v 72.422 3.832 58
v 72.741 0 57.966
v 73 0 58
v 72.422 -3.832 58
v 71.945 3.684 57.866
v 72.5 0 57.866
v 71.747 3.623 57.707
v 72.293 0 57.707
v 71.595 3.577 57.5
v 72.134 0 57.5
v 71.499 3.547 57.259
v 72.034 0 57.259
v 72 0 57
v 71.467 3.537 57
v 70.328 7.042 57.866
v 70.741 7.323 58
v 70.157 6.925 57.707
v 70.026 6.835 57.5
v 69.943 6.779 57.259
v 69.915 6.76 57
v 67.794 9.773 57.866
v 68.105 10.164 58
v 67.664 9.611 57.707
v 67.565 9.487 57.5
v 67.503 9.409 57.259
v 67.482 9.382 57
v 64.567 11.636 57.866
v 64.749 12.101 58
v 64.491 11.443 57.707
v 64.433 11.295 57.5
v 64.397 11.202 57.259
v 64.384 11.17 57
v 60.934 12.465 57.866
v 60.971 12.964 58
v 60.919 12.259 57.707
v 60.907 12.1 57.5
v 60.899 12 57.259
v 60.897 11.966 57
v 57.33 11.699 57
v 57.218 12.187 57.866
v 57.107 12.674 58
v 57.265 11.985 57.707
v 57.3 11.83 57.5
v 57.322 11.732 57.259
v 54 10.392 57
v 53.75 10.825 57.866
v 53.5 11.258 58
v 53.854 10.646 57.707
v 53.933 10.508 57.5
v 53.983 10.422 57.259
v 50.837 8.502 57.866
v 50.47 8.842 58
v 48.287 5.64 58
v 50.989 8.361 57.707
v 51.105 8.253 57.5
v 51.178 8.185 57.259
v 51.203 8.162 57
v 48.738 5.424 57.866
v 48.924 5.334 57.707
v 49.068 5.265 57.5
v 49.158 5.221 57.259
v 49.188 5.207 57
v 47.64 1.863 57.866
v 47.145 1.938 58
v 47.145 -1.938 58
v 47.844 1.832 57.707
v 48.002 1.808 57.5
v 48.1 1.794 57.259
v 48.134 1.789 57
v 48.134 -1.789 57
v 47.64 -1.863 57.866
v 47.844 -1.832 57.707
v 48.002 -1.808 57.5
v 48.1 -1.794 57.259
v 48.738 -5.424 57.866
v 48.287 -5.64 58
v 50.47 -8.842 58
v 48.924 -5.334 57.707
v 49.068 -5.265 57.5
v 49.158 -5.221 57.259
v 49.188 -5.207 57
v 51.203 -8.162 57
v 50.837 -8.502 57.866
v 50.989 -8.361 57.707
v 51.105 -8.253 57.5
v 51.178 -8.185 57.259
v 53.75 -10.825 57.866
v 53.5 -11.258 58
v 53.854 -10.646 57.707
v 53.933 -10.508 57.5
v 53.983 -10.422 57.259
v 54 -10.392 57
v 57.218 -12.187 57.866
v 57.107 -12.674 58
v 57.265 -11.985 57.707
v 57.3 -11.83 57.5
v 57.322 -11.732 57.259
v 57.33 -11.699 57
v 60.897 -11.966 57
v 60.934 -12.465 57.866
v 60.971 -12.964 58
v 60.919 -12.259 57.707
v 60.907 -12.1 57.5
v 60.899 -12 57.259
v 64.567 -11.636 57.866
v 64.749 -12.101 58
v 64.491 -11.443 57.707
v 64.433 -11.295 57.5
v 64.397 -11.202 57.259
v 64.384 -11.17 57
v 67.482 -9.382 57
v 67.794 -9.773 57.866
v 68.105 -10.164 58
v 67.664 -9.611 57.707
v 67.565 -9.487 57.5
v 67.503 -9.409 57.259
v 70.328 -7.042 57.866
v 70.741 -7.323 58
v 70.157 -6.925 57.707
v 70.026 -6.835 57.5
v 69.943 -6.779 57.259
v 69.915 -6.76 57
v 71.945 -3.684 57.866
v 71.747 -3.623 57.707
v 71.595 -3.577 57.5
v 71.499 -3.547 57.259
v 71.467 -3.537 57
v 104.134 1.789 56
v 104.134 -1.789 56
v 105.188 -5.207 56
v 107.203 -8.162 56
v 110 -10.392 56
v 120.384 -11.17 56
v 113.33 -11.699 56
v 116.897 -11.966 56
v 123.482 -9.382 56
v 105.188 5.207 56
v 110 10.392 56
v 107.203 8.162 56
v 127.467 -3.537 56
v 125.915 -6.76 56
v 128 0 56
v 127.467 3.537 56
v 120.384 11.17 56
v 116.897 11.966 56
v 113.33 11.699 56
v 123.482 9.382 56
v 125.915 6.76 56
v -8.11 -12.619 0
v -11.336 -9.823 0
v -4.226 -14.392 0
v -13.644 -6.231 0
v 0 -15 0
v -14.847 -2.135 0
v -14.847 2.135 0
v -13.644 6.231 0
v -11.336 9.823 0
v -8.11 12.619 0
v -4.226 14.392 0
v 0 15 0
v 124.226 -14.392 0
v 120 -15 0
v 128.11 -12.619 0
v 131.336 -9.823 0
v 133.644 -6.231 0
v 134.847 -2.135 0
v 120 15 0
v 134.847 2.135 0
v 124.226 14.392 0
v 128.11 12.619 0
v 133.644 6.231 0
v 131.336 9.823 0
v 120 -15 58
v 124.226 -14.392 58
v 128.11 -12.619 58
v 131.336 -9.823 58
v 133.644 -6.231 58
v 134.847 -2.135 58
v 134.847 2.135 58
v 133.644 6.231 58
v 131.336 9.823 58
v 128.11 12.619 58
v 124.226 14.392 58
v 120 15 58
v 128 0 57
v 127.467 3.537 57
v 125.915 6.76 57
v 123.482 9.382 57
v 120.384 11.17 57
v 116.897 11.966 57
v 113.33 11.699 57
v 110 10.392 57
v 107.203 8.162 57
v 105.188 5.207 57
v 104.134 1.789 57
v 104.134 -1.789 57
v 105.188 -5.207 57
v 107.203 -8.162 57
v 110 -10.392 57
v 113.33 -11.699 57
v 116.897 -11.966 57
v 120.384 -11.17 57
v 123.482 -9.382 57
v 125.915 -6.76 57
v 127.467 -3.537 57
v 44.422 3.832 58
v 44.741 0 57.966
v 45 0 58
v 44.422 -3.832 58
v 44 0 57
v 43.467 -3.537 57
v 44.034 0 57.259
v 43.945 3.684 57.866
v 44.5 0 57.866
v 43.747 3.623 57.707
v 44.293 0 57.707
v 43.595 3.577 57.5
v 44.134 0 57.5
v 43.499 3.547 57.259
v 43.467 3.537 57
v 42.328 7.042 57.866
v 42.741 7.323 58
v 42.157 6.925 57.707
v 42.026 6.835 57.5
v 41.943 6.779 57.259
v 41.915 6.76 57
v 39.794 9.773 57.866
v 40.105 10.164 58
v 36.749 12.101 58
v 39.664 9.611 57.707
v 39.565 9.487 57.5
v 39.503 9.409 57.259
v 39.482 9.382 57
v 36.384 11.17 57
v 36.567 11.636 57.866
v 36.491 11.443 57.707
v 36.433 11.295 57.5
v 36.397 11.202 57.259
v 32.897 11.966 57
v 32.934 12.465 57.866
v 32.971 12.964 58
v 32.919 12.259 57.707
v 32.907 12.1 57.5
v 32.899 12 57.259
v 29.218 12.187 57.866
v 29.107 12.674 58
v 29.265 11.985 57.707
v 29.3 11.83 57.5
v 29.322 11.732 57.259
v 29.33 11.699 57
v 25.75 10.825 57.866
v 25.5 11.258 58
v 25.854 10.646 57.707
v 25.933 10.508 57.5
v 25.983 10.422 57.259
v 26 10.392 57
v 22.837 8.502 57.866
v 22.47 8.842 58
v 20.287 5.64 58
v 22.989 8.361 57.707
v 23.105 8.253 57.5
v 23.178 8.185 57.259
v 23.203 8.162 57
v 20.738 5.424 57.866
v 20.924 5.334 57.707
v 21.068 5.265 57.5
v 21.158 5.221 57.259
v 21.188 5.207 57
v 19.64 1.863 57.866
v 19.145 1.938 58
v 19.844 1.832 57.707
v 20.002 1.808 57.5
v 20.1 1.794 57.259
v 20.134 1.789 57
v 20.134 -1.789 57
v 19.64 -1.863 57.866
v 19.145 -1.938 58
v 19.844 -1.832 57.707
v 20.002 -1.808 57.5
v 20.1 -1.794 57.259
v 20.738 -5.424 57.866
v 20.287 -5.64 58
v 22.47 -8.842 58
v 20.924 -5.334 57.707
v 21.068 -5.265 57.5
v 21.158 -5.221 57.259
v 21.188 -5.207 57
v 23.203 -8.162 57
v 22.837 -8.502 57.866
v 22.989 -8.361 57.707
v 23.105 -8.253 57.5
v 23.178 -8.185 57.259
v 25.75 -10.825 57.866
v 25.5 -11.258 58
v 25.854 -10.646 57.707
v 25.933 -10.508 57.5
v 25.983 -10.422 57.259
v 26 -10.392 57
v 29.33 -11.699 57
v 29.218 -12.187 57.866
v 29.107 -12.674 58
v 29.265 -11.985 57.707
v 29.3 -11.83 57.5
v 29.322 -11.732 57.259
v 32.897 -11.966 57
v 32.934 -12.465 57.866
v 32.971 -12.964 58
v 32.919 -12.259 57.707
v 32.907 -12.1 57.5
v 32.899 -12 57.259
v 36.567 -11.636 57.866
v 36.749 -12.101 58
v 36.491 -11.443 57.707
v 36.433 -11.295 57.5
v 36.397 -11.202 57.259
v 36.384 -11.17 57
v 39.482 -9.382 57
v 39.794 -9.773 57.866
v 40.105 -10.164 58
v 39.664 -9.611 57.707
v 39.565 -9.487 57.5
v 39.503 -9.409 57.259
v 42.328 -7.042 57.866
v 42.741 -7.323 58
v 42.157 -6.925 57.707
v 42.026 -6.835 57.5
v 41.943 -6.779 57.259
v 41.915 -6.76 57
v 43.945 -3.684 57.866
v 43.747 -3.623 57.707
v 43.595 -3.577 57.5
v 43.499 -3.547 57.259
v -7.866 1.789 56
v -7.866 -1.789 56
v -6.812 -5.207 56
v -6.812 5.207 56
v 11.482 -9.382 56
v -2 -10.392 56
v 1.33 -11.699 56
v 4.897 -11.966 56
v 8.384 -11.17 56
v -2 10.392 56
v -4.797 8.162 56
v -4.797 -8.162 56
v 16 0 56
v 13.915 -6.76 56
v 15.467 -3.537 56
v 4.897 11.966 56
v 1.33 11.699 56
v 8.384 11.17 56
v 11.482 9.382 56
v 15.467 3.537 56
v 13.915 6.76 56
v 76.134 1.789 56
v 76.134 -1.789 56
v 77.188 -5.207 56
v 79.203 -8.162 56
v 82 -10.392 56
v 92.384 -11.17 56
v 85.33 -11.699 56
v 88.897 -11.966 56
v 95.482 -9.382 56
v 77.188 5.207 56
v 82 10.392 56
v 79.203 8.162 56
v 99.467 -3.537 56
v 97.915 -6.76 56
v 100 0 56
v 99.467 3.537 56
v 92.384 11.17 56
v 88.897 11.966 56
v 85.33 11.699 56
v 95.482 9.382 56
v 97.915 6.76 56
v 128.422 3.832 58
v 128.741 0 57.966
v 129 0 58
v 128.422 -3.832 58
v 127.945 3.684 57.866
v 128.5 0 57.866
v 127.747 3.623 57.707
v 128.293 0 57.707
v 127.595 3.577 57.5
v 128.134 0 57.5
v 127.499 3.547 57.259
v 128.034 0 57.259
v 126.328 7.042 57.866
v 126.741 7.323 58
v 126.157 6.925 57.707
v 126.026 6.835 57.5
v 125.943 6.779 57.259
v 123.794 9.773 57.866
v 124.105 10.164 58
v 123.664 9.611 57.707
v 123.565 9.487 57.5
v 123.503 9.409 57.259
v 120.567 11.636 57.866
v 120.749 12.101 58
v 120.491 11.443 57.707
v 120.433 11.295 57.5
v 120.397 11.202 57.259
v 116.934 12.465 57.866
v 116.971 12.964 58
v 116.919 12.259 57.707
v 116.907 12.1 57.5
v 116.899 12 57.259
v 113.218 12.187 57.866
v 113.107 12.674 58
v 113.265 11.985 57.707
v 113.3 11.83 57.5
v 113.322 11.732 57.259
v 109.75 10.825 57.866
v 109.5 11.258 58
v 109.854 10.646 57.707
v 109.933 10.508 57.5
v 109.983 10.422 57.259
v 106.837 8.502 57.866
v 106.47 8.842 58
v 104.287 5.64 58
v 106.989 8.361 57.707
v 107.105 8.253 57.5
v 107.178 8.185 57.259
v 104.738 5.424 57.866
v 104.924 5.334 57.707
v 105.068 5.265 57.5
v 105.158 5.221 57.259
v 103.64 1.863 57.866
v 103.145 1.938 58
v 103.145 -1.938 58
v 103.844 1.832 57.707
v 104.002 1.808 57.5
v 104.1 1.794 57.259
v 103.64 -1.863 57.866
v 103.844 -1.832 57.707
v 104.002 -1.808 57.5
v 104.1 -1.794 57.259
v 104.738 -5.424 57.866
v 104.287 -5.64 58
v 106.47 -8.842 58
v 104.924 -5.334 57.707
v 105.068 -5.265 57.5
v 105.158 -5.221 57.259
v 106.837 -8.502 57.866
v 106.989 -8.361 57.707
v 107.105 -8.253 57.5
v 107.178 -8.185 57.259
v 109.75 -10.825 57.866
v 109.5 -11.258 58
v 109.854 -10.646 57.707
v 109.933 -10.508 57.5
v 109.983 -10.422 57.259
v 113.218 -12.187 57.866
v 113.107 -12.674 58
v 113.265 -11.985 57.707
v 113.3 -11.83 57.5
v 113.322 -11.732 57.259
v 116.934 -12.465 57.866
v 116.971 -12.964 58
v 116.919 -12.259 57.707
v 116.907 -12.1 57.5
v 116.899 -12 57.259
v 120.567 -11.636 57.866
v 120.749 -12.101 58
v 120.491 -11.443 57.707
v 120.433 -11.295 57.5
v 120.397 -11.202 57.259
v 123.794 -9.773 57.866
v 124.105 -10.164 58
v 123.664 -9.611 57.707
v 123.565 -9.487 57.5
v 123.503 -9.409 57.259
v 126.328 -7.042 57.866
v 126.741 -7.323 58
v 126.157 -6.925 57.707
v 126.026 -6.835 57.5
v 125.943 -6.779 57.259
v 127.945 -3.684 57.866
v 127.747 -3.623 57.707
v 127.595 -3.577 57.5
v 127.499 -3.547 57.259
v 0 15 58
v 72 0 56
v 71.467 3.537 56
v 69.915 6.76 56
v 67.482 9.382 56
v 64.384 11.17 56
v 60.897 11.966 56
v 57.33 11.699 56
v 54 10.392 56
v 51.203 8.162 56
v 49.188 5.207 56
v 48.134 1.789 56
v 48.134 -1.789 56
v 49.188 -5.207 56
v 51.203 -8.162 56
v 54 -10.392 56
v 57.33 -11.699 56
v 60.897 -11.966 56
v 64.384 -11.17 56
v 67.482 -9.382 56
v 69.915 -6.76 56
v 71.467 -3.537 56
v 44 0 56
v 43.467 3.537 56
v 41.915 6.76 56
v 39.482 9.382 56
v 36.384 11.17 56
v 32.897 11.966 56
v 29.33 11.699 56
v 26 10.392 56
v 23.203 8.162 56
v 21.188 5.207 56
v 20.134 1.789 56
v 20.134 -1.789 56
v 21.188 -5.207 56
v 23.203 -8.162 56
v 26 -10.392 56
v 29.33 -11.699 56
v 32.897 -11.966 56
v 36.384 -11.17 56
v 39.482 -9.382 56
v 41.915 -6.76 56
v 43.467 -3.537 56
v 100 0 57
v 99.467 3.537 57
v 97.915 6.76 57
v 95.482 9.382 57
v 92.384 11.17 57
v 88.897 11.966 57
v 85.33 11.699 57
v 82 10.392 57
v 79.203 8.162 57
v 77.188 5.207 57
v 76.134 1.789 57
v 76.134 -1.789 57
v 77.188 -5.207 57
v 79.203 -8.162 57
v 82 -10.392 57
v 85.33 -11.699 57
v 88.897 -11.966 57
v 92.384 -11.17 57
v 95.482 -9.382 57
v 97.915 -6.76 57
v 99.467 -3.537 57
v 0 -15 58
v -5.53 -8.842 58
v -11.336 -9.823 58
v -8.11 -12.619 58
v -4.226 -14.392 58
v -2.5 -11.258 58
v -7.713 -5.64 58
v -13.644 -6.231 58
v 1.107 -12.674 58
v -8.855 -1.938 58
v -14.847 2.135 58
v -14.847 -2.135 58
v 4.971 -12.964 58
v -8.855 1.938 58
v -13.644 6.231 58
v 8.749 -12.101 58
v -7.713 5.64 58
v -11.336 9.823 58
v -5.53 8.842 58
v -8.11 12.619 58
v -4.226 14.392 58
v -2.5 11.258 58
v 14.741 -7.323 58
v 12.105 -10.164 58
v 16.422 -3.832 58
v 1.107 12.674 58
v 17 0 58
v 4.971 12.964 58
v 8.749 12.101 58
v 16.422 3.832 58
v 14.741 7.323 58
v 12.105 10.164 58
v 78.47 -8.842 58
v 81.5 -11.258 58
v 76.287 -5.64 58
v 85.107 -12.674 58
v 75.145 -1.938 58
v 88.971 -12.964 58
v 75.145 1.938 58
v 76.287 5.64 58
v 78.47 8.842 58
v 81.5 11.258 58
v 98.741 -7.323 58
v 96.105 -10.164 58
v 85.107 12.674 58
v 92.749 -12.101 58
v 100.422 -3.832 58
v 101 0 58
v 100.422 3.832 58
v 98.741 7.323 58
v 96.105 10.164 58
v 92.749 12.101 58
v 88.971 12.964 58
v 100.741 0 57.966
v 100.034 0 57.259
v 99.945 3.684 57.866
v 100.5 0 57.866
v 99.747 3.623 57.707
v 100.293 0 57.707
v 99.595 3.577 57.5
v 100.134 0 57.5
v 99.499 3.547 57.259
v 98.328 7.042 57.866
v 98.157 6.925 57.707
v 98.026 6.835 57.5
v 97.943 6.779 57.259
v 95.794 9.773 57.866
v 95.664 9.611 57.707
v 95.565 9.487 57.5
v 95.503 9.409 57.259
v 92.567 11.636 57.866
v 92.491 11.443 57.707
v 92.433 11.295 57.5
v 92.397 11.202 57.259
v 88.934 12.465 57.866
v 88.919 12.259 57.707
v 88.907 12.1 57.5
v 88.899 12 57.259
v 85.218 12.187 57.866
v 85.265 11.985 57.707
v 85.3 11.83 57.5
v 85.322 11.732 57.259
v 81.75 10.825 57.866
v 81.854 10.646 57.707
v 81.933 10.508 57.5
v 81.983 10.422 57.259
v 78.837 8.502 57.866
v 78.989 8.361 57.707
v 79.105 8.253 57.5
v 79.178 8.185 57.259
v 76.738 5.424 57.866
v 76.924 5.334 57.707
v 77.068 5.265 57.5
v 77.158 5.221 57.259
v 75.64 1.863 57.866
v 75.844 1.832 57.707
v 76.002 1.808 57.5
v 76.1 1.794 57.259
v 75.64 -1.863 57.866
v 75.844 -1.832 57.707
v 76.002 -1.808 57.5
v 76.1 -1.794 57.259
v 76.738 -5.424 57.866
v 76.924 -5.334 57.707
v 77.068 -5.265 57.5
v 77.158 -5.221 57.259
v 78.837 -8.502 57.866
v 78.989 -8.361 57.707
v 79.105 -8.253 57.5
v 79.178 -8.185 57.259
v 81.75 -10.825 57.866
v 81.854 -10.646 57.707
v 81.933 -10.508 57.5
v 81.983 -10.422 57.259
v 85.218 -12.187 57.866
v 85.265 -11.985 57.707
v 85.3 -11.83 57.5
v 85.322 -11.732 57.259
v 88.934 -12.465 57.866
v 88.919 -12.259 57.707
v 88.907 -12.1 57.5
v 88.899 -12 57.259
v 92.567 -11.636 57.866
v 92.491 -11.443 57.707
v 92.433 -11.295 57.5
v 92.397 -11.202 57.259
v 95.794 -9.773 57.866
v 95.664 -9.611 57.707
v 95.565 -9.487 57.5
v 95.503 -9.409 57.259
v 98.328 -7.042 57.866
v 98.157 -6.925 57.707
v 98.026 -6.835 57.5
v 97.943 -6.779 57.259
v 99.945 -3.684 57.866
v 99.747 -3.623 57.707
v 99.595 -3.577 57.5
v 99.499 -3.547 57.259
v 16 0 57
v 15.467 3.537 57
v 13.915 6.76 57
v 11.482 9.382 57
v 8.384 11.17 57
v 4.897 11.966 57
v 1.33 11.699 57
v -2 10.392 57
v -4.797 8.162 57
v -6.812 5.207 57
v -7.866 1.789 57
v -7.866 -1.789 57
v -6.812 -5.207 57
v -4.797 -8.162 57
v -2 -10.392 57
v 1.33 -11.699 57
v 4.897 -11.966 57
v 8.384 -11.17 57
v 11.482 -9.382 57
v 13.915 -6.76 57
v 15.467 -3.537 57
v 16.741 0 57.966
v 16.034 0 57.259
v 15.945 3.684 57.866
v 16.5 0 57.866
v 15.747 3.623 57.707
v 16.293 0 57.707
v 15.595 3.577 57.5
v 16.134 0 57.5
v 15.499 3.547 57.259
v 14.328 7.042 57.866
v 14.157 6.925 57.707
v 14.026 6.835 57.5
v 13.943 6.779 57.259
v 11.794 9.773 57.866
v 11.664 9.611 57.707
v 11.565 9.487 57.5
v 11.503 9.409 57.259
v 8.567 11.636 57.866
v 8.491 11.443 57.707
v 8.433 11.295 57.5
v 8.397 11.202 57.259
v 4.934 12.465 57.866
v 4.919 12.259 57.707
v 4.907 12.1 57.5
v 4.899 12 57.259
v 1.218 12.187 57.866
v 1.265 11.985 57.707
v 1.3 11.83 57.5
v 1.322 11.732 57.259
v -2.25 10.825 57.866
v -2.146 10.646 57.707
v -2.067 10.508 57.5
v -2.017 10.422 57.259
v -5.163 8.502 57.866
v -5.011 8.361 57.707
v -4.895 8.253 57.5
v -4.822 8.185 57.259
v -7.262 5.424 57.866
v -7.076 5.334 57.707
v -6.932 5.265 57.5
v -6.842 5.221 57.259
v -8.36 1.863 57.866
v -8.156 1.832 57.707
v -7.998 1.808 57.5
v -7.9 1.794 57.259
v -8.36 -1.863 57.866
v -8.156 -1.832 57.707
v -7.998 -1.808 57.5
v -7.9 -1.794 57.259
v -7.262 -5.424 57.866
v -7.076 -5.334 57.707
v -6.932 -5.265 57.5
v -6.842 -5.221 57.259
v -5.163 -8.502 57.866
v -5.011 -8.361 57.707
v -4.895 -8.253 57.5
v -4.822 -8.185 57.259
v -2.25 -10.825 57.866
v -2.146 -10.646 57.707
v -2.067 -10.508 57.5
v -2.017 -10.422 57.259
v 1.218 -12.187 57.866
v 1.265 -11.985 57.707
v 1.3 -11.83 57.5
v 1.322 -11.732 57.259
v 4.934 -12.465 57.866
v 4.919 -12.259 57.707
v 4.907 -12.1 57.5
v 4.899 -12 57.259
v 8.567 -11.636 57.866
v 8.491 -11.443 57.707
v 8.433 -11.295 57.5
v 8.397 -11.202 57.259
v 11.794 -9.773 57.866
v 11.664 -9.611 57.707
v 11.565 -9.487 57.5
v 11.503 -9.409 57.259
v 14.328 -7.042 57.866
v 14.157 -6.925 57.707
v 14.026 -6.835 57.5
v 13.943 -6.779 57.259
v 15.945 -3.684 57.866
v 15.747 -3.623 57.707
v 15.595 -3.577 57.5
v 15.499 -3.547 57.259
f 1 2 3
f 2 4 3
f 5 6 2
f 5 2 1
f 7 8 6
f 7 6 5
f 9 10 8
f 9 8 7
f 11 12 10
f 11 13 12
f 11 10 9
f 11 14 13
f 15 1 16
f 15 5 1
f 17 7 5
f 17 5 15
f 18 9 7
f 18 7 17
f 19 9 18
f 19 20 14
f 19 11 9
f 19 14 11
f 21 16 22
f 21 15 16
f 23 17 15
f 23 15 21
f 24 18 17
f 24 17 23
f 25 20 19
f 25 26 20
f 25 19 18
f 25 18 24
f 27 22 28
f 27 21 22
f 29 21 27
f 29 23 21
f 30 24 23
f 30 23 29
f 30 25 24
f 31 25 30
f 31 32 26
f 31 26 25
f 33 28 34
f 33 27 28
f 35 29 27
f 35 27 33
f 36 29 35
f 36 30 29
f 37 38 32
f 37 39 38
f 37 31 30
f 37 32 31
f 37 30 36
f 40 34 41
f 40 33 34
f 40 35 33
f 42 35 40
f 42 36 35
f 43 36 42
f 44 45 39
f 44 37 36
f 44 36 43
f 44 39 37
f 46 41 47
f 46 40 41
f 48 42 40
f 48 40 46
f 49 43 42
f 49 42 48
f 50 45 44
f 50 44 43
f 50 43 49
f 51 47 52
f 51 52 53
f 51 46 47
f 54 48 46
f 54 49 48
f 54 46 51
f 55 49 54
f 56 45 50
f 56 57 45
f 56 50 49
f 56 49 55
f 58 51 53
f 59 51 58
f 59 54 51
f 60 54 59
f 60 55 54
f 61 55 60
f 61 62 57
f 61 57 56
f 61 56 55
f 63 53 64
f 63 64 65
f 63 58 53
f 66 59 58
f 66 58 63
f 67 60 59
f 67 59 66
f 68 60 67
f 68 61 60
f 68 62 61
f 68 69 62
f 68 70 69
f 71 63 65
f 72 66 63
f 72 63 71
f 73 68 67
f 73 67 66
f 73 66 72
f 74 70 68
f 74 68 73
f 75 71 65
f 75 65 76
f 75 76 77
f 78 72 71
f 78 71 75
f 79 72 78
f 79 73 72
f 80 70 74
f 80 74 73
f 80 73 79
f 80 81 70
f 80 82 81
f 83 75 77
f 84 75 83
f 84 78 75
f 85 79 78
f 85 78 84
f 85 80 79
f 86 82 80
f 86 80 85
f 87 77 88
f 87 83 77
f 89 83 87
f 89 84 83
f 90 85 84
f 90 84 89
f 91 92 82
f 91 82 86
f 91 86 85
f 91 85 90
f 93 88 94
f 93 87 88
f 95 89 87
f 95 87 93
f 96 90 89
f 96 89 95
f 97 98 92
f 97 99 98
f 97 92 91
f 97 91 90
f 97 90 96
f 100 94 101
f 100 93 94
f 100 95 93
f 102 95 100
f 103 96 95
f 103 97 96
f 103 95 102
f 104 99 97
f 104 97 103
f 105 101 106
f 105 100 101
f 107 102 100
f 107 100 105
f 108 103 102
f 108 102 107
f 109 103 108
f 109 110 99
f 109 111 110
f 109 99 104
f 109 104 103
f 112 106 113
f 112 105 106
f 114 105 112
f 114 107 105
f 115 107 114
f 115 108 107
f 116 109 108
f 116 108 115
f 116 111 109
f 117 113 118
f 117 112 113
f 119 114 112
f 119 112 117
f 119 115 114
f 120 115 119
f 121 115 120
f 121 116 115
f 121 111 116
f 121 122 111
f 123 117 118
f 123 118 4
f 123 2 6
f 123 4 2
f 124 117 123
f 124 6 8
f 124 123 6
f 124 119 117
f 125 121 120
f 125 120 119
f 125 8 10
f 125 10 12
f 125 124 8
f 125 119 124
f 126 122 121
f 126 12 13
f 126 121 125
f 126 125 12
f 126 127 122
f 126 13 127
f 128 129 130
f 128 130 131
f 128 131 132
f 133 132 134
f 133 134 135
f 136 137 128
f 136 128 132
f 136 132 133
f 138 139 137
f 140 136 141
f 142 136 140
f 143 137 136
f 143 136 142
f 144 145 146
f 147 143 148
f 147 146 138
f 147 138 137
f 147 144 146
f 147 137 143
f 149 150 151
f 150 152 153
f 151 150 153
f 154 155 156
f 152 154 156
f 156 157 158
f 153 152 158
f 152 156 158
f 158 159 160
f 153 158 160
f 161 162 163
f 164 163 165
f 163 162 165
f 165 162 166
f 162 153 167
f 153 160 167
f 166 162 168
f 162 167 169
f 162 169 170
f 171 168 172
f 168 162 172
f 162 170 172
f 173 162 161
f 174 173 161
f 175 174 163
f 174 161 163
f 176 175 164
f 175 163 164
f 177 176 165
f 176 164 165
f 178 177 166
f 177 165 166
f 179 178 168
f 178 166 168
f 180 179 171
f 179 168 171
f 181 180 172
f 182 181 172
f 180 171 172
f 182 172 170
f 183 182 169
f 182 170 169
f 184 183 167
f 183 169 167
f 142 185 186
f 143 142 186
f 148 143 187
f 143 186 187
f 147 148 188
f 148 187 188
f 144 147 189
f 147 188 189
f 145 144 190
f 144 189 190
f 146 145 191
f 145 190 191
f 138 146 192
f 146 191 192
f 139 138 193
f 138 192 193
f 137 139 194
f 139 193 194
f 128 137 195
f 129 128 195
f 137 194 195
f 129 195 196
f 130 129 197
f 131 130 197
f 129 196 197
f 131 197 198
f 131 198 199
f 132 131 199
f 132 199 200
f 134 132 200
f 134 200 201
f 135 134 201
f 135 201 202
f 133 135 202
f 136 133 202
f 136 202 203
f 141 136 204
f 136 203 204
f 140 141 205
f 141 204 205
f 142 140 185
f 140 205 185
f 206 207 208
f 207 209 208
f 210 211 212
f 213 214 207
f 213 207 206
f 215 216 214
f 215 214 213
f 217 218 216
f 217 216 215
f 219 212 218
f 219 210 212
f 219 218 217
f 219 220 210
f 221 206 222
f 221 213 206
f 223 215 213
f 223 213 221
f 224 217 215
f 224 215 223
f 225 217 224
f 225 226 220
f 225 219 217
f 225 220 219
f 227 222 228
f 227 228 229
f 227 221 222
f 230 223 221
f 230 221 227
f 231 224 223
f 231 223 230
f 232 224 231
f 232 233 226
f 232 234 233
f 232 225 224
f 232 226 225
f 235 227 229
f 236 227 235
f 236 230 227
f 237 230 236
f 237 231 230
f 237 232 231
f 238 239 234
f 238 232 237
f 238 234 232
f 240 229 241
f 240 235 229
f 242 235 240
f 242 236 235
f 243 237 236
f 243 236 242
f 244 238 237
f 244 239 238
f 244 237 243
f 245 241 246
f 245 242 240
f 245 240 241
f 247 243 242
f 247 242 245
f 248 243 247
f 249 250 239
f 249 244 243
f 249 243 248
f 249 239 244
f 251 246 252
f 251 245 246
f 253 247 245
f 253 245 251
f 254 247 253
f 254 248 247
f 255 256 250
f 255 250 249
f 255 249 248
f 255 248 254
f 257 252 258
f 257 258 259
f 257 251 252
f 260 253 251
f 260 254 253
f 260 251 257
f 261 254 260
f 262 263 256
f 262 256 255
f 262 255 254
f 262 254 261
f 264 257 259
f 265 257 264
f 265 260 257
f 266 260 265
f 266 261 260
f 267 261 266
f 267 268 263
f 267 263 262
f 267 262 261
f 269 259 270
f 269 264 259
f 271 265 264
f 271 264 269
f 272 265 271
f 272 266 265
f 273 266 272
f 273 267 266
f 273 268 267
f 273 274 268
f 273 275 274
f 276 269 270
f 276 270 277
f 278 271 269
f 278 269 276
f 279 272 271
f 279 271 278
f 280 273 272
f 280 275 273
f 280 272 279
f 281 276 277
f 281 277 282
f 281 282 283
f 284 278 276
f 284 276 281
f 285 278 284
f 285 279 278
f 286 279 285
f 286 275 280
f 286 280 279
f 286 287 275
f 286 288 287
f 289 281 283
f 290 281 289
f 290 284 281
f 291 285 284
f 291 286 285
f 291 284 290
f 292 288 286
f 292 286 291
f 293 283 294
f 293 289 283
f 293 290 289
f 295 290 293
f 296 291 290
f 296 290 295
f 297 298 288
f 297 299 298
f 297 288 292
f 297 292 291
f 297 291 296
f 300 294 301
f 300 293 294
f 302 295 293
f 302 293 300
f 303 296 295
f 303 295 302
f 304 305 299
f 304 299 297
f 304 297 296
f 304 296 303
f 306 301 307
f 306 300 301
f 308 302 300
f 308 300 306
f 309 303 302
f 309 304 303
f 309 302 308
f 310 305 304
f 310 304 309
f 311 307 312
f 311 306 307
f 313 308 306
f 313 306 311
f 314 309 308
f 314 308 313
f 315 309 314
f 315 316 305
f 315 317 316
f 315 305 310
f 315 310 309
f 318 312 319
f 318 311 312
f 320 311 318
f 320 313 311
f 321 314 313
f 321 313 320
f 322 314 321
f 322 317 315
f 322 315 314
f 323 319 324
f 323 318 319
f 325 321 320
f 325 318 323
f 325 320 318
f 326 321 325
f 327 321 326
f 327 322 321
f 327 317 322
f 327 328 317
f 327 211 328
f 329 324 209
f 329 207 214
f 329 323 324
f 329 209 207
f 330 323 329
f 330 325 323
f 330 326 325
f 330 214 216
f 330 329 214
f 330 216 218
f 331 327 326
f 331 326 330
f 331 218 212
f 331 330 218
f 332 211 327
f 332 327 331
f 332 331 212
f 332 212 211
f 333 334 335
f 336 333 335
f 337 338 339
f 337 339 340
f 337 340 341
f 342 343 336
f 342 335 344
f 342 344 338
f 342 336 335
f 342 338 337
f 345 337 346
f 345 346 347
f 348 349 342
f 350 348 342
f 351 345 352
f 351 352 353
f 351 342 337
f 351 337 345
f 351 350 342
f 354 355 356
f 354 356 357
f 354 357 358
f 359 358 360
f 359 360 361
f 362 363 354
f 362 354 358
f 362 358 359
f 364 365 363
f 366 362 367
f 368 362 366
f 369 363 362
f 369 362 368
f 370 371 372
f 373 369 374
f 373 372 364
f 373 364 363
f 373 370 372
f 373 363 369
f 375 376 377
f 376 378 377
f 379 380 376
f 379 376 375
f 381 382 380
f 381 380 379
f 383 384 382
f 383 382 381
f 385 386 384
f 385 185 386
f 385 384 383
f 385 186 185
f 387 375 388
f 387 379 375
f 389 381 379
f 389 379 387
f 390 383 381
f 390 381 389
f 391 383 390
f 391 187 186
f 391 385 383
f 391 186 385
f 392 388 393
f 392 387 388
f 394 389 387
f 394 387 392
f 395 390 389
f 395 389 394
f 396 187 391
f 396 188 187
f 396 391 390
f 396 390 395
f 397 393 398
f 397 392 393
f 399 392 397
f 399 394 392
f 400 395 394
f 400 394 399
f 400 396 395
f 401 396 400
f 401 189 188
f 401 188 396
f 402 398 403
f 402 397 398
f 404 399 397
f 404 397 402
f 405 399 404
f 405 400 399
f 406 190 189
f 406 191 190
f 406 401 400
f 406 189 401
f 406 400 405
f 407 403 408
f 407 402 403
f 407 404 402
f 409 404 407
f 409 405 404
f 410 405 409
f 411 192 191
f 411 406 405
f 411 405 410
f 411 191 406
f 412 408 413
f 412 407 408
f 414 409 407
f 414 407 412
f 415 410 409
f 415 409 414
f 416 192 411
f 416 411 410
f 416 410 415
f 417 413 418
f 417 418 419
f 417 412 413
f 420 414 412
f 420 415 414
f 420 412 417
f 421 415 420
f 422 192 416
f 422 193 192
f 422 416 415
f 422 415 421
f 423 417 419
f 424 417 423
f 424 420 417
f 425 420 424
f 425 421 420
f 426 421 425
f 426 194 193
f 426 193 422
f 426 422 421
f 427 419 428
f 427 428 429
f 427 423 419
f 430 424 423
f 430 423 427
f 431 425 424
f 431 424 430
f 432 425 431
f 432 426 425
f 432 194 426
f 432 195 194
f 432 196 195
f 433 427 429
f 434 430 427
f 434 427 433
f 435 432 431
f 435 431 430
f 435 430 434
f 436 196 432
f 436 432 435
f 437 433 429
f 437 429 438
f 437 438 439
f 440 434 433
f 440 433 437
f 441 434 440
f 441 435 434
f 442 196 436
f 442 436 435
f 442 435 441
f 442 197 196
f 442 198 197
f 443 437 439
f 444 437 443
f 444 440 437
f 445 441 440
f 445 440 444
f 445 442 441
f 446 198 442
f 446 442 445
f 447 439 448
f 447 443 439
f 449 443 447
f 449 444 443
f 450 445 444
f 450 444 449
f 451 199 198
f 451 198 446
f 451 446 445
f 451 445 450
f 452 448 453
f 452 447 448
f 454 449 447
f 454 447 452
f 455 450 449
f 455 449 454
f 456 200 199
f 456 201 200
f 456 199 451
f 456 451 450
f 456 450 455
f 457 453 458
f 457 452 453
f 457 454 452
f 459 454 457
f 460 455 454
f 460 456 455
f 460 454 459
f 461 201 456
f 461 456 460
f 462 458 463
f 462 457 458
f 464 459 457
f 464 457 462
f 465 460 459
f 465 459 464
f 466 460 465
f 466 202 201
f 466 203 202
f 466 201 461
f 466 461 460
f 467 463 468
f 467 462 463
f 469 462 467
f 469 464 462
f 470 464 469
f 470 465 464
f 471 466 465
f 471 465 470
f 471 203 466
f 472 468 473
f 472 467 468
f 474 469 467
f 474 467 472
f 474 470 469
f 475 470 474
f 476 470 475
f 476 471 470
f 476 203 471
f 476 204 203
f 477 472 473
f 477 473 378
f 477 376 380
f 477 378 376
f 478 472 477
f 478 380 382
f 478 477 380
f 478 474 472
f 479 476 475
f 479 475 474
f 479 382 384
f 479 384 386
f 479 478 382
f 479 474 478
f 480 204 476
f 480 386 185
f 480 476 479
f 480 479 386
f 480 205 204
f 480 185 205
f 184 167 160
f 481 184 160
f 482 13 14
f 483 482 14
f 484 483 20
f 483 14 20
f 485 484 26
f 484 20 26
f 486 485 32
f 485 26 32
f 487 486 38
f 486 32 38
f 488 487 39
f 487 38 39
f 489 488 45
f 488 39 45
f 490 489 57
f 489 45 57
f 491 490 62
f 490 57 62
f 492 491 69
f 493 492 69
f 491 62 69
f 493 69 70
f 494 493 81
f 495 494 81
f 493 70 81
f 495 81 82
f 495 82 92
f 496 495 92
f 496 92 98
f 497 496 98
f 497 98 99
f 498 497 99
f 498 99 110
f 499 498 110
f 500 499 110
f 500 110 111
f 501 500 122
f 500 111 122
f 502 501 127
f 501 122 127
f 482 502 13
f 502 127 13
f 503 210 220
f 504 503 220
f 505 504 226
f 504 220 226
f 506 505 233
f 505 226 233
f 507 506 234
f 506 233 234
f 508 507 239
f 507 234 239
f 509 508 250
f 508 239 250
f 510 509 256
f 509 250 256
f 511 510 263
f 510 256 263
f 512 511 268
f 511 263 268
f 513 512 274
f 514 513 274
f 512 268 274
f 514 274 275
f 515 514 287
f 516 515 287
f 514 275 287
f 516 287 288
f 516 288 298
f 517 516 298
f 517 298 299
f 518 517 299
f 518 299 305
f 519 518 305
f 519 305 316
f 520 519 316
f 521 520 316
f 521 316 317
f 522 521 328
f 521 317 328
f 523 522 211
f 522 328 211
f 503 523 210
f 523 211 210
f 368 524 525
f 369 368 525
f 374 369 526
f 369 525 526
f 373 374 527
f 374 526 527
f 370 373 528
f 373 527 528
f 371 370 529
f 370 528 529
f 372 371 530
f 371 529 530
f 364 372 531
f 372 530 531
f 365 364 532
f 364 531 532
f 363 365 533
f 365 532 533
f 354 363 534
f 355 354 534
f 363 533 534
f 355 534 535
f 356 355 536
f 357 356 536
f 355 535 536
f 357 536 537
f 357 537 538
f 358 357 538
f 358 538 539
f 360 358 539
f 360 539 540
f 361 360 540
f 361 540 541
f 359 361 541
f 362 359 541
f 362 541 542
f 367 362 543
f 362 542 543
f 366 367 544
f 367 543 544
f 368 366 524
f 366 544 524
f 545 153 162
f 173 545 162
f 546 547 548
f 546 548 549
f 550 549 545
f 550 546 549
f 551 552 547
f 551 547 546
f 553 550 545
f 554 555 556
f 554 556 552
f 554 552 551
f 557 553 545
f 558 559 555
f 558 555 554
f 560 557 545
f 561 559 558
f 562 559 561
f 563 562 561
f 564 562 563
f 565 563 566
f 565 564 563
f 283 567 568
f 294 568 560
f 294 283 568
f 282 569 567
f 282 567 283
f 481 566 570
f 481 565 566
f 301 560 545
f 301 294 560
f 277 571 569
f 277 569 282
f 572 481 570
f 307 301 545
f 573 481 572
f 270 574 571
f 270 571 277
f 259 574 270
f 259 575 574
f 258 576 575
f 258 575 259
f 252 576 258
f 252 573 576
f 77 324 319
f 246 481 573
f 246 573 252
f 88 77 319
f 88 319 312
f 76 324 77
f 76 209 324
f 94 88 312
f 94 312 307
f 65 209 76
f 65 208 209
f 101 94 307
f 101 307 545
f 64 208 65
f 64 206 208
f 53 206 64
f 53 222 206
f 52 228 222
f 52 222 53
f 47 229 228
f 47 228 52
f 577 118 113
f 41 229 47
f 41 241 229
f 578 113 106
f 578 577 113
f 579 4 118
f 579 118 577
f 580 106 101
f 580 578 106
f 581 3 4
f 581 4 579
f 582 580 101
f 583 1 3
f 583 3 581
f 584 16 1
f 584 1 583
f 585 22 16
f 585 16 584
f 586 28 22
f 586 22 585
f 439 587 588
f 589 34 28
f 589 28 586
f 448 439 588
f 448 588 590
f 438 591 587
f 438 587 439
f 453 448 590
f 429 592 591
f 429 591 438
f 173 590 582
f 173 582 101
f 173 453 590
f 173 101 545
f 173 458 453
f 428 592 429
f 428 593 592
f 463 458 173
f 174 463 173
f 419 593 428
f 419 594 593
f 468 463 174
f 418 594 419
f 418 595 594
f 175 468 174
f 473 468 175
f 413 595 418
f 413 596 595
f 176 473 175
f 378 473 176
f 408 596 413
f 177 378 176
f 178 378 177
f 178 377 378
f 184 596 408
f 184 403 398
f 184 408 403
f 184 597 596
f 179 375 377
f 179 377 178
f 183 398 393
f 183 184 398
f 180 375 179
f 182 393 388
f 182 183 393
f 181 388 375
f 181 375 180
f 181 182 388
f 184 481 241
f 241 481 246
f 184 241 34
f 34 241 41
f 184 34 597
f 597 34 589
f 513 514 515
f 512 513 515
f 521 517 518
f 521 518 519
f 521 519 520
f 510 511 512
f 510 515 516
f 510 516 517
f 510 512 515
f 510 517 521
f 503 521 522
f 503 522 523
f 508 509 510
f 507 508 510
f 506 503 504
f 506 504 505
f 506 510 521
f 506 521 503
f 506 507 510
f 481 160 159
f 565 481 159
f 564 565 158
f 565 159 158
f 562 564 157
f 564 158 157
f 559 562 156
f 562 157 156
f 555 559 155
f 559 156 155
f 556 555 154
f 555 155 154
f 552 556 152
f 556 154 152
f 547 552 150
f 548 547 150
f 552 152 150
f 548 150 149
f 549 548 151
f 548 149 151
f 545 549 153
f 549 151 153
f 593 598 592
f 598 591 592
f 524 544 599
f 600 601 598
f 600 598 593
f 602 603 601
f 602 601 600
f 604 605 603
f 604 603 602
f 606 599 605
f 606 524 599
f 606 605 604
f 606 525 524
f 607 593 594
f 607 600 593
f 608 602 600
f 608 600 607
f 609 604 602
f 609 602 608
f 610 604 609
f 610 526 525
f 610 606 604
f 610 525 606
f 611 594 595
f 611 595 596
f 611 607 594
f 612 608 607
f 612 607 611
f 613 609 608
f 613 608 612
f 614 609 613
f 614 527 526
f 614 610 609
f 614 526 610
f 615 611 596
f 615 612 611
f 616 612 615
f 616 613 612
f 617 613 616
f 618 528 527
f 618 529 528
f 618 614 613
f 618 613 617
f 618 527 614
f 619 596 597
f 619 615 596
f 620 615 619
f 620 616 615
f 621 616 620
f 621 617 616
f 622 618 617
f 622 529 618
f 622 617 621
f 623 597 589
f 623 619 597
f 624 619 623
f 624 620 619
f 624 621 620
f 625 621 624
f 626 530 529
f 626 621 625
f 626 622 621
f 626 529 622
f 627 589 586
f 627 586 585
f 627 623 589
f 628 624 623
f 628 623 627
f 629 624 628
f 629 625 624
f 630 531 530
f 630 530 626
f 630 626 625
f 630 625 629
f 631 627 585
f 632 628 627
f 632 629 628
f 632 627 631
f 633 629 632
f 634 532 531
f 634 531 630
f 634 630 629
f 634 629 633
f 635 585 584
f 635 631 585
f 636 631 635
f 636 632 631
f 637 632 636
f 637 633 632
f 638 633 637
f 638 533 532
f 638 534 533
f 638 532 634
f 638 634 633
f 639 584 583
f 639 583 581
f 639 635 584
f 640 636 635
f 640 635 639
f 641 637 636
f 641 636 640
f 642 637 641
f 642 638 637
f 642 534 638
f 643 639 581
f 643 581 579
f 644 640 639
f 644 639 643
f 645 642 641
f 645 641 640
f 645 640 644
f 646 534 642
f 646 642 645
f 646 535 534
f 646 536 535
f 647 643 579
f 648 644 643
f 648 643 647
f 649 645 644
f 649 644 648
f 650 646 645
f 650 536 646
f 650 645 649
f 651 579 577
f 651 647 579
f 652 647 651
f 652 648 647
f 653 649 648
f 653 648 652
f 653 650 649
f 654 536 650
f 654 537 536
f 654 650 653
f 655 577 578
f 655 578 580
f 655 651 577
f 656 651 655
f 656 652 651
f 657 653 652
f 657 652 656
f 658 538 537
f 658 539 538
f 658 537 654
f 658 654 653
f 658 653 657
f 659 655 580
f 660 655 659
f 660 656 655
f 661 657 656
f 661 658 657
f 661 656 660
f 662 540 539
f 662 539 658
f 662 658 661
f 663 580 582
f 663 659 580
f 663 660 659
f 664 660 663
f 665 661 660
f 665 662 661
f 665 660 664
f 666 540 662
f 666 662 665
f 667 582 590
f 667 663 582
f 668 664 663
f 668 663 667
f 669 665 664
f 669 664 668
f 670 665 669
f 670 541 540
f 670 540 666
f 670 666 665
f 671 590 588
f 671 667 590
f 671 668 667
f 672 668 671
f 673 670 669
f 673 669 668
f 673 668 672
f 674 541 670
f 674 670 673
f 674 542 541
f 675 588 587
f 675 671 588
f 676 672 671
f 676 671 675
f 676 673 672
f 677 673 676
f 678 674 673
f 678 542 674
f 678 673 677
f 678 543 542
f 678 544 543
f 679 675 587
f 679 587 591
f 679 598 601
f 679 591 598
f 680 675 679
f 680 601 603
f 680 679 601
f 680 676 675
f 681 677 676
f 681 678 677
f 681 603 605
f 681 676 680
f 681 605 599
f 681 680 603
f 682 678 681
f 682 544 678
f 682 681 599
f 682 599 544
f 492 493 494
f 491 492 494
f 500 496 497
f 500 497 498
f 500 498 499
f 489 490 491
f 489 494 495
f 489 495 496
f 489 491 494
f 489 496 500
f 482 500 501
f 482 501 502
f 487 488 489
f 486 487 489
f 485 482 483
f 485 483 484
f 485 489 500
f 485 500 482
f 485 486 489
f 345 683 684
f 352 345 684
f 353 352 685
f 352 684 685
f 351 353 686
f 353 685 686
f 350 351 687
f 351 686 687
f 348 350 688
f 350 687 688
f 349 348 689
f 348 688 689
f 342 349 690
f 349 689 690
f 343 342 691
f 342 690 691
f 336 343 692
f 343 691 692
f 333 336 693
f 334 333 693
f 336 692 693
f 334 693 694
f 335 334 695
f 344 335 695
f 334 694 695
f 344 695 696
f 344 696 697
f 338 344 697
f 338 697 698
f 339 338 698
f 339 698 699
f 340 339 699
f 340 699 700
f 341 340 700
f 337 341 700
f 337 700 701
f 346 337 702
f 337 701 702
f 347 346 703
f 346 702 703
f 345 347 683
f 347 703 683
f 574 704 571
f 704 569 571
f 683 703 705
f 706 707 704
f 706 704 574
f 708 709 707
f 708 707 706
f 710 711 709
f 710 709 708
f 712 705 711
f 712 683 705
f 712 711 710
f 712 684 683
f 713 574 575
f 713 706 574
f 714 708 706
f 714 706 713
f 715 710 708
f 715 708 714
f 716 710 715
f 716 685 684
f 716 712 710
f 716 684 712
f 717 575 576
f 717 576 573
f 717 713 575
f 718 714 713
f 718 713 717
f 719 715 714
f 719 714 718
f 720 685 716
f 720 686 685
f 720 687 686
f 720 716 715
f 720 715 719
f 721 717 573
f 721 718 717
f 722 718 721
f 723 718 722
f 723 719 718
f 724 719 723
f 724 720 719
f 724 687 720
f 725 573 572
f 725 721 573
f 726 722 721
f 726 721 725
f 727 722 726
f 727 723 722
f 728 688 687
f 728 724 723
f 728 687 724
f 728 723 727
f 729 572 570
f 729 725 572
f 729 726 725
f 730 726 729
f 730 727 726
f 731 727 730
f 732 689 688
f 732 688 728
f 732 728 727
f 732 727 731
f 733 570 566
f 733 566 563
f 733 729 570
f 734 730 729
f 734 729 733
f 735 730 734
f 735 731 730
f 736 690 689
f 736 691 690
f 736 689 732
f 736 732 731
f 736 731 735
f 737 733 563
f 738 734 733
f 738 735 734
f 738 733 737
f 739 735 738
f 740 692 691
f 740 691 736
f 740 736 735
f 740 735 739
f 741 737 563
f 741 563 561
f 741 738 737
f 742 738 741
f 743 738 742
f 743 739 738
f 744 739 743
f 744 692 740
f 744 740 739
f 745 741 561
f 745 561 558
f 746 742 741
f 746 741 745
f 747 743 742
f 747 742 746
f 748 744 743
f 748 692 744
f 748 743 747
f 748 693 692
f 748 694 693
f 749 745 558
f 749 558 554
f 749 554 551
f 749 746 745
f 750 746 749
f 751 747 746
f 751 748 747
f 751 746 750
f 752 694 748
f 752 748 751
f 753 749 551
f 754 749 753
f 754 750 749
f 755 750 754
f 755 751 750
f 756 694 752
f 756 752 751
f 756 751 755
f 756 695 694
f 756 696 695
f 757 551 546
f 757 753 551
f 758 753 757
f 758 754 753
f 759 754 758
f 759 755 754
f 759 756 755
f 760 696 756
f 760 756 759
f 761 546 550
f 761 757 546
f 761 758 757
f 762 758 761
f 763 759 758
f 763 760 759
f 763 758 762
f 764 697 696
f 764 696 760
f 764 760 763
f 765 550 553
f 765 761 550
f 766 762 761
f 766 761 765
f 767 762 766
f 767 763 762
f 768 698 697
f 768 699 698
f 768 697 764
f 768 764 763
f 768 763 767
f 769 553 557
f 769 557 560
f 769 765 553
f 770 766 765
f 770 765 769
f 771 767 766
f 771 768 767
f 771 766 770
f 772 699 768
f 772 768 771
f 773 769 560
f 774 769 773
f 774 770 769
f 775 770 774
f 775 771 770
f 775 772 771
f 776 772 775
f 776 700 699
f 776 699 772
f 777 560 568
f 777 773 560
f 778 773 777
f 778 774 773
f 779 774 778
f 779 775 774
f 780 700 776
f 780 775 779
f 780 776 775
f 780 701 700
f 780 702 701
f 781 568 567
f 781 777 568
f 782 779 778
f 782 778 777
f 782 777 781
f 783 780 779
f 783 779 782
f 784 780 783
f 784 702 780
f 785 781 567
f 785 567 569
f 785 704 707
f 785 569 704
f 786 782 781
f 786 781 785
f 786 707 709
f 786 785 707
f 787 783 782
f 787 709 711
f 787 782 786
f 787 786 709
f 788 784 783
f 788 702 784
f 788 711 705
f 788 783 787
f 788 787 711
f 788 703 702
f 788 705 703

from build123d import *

# Parameters (mm, degrees)
BOSS_EXTRUDE1_DEPTH = 58
SKETCH2_R           = 12
CUT_EXTRUDE1_DEPTH  = 2
FILLET1_R           = 1


with BuildPart() as part:
    # Sketch1 → Boss-Extrude1 (new body)
    with BuildSketch(Plane.XY):
        with BuildLine():
            Line((120, 15), (0, 15))
            ThreePointArc((0, 15), (-15, 0), (0, -15))
            Line((0, -15), (120, -15))
            ThreePointArc((120, -15), (135, 0), (120, 15))
        make_face()
    extrude(amount=BOSS_EXTRUDE1_DEPTH)

    # Sketch2 → Cut-Extrude1 (cut)
    with BuildSketch(Plane.XY.offset(58)):
        with Locations((60, 0)):
            Circle(SKETCH2_R)
        with Locations((88, 0)):
            Circle(SKETCH2_R)
        with Locations((116, 0)):
            Circle(SKETCH2_R)
        with Locations((32, 0)):
            Circle(SKETCH2_R)
        with Locations((4, 0)):
            Circle(SKETCH2_R)
    extrude(amount=-CUT_EXTRUDE1_DEPTH, mode=Mode.SUBTRACT)

    # Fillet1
    fillet1_edges = [part.edges().sort_by_distance(p)[0] for p in [
        (-8, 0, 58),
        (20, 0, 58),
        (104, 0, 58),
        (76, 0, 58),
        (48, 0, 58),
    ]]
    fillet(fillet1_edges, radius=FILLET1_R)


solid = part.part
